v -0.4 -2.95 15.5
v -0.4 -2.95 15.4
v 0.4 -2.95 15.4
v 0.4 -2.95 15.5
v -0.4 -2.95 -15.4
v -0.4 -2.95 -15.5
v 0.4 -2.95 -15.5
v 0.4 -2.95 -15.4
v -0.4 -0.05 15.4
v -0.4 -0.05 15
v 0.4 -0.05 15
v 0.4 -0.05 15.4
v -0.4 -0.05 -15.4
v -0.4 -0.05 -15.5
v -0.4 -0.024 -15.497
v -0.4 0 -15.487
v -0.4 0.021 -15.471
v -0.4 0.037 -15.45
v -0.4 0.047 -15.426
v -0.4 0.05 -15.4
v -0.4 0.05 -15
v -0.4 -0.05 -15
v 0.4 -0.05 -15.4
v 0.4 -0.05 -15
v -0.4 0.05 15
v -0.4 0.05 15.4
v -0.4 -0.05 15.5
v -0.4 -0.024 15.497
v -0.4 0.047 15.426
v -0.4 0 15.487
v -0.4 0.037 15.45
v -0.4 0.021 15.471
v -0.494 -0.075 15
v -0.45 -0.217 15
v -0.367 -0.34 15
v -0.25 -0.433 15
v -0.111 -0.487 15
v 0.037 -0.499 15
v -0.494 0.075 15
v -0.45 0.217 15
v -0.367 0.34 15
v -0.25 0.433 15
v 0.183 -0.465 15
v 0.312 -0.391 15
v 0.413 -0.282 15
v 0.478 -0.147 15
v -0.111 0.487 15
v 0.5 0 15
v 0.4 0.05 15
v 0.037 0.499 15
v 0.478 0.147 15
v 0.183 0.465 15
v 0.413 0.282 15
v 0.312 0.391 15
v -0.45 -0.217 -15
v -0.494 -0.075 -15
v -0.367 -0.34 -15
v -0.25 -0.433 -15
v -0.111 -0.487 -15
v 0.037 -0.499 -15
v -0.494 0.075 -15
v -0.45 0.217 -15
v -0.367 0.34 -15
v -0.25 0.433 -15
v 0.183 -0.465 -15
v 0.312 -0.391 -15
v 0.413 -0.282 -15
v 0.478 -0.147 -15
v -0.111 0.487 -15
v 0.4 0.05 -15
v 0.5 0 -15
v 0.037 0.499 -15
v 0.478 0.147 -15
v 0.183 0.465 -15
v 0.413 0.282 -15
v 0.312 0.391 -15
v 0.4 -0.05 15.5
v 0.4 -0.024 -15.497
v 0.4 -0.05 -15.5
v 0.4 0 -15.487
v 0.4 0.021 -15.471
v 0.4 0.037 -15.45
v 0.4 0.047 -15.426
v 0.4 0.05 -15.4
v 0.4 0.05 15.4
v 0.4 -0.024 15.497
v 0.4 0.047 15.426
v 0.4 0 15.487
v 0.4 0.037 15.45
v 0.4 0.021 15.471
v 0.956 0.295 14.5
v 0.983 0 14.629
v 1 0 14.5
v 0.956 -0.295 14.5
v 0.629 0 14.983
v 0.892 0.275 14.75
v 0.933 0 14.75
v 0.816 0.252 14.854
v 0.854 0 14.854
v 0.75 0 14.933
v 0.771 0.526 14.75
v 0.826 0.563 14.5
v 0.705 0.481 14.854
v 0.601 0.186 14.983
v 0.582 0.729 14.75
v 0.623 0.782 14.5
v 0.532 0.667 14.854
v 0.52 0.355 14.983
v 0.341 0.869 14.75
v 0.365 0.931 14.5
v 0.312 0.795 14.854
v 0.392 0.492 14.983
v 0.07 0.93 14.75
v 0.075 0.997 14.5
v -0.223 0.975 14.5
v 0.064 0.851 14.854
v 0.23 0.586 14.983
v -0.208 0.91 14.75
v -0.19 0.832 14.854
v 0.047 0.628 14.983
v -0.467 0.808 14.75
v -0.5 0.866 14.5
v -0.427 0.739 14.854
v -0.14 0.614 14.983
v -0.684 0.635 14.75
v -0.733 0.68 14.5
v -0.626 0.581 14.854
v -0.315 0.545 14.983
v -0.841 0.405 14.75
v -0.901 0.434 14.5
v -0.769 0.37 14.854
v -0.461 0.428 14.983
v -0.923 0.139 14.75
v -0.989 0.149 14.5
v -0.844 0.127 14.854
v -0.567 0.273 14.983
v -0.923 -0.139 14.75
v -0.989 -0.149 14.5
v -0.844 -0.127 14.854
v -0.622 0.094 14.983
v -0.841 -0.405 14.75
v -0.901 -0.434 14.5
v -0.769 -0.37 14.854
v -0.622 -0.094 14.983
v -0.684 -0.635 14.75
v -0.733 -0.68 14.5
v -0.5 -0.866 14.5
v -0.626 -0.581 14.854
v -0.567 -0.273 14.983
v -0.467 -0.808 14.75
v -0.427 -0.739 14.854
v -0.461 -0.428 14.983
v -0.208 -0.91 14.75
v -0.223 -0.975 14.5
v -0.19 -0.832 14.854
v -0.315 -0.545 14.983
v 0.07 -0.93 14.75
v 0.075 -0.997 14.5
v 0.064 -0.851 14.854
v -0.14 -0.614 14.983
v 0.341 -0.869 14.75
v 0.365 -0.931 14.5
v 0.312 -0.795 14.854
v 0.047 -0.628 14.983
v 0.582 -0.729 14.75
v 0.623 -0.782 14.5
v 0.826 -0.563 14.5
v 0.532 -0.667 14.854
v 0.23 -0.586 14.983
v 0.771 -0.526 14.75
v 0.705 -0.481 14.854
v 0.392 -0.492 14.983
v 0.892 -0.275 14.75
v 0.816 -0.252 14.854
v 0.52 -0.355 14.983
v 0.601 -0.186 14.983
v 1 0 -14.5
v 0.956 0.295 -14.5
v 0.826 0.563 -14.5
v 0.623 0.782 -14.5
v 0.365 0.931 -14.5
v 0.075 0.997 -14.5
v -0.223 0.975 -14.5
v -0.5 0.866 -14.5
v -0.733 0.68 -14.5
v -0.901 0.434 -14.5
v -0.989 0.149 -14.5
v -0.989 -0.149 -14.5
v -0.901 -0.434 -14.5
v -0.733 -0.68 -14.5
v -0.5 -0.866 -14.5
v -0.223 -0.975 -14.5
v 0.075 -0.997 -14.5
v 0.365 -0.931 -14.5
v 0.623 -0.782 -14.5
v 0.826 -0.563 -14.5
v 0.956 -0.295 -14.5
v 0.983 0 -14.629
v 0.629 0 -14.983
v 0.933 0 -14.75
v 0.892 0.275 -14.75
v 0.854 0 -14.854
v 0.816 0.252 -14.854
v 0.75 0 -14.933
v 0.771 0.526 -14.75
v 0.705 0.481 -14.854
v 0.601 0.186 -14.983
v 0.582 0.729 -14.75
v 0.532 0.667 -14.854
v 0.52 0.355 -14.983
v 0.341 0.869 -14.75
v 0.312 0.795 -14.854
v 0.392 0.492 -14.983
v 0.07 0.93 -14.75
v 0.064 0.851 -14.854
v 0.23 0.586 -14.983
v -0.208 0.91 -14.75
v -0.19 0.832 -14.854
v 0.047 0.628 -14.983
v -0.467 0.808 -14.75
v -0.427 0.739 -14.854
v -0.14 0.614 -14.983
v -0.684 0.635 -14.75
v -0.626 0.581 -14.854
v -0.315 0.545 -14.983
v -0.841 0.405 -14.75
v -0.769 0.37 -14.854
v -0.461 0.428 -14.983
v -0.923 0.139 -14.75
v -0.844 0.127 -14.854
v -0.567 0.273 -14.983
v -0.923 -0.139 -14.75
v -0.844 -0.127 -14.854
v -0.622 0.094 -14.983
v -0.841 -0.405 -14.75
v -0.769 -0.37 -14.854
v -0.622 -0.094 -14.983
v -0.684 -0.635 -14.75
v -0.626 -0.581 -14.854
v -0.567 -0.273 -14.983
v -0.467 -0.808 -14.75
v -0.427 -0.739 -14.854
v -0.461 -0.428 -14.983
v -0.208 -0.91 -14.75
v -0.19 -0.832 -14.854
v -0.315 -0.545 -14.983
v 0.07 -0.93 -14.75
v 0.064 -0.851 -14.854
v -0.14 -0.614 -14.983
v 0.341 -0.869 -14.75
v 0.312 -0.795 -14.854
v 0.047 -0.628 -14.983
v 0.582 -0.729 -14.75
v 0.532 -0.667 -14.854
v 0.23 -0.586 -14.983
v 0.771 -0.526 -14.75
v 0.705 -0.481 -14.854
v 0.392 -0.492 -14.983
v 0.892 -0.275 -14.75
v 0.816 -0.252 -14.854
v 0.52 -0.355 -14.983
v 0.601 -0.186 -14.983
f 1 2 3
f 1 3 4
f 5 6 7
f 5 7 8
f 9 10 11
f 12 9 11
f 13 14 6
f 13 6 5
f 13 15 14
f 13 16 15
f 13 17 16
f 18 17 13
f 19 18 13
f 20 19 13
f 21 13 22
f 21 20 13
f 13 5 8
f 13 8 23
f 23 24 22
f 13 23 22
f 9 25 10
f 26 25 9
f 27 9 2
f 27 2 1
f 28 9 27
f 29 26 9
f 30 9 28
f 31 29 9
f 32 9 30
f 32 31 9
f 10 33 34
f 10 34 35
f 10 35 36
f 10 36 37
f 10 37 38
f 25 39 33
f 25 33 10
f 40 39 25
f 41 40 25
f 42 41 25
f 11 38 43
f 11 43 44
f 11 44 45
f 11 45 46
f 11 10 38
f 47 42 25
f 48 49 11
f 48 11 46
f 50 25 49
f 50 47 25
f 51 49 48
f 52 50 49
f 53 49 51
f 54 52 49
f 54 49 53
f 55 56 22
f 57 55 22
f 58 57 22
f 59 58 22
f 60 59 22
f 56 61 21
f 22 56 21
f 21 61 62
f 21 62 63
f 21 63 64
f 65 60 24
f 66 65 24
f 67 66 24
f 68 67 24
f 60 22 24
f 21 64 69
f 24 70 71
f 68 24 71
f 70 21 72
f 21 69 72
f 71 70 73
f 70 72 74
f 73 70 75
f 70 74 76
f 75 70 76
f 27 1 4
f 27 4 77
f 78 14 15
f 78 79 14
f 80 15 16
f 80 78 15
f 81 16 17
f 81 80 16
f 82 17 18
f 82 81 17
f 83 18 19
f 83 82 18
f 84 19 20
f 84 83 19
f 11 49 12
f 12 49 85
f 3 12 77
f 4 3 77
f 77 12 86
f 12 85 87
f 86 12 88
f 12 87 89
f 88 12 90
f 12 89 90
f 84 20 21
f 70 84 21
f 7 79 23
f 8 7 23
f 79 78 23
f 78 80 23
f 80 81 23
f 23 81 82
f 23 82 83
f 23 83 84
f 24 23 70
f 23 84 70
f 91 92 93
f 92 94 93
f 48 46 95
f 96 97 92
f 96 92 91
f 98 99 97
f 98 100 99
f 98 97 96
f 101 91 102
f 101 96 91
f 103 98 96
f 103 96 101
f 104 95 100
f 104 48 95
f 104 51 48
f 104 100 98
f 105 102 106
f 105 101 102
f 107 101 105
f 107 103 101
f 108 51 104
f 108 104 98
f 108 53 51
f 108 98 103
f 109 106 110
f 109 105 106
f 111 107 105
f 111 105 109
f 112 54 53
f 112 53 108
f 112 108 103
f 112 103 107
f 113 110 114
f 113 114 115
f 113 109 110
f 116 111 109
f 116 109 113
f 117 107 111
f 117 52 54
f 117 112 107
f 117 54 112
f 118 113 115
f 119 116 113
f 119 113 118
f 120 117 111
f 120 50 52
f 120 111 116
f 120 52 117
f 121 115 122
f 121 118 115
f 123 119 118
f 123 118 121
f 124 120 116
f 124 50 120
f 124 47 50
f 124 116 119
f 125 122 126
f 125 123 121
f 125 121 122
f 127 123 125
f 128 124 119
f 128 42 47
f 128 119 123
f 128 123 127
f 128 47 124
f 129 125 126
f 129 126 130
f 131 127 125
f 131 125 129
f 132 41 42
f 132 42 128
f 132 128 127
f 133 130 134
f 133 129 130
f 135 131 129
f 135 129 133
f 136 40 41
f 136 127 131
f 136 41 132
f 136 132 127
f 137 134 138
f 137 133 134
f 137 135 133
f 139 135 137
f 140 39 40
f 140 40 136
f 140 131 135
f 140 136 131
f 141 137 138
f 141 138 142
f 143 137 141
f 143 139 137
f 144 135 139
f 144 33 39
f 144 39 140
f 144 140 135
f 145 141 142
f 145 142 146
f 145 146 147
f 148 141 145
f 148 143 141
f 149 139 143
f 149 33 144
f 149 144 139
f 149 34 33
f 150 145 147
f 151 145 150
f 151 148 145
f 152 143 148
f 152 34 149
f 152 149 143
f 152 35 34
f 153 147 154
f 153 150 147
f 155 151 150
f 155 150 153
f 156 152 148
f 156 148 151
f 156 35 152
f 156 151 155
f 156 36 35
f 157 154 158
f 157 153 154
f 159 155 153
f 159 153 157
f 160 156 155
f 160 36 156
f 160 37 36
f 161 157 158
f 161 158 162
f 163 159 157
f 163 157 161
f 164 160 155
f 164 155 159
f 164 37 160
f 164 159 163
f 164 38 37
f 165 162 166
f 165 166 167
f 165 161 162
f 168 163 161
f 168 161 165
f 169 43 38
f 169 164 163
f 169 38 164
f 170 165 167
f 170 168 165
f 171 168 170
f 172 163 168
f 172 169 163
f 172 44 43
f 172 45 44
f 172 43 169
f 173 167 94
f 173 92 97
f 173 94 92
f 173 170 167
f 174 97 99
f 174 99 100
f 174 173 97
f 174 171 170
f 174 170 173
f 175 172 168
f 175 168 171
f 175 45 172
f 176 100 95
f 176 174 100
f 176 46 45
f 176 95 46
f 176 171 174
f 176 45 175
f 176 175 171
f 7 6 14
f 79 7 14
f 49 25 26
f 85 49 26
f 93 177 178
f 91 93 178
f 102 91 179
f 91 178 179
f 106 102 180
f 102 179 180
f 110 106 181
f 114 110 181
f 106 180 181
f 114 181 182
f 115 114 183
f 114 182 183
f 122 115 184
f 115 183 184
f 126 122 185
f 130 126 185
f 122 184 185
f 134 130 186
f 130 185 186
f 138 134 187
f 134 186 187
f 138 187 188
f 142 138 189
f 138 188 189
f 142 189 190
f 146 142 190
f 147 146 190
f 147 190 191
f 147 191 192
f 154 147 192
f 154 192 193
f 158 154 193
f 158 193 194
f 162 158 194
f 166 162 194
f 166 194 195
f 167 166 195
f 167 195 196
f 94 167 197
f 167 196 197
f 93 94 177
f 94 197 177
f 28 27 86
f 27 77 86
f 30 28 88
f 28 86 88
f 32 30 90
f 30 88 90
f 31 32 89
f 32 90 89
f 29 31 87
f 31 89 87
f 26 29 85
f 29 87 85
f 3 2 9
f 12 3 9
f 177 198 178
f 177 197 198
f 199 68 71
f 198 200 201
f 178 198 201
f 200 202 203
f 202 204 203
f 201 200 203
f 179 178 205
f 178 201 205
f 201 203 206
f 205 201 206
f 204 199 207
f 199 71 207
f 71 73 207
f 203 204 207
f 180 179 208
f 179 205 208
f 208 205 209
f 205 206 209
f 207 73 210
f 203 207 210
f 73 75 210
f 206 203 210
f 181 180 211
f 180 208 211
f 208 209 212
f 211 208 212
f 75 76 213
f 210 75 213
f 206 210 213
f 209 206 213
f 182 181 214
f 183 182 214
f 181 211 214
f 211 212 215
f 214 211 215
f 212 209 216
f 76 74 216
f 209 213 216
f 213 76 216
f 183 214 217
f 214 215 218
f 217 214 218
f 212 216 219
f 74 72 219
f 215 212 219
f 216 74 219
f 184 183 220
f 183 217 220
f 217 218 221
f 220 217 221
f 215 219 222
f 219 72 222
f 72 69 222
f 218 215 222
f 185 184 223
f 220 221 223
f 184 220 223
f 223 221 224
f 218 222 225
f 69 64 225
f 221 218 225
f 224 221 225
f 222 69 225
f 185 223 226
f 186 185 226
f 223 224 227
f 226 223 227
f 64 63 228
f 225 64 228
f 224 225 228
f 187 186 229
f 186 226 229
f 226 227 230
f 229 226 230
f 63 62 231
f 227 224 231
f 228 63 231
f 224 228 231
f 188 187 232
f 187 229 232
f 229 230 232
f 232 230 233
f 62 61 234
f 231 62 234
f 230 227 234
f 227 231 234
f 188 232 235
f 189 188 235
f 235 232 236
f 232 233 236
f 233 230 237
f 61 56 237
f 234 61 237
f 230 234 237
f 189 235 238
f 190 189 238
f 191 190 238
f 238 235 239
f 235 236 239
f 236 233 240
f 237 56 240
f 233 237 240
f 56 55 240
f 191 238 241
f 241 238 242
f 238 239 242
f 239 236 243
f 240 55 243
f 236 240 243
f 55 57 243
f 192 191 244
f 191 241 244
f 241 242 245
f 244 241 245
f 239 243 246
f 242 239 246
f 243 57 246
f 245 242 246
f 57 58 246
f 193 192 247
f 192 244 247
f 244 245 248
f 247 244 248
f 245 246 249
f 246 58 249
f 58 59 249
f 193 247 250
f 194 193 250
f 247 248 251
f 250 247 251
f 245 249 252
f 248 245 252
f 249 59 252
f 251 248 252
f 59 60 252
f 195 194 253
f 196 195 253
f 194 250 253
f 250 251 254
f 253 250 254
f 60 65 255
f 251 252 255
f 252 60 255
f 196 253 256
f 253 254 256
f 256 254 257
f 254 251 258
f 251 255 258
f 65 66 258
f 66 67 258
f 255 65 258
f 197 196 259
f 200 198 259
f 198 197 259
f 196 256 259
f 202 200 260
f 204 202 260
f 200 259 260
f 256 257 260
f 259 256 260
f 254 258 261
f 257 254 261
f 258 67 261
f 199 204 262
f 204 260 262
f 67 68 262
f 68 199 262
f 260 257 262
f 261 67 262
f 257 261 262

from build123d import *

# Parameters (mm, degrees)
BOSS_EXTRU_1_DEPTH      = 15
BOSS_EXTRU_1_DEPTH_BACK = 15
ESQUISSE1_R             = 1
ESQUISSE2_W             = 0.8
ESQUISSE2_H             = 0.1
BOSS_EXTRU_2_DEPTH      = 1
ESQUISSE3_W             = 0.8
ESQUISSE3_H             = 0.1
BOSS_EXTRU_3_DEPTH      = 1
CONG_1_R                = 0.5
ESQUISSE4_W             = 0.1
ESQUISSE4_H             = 3
BOSS_EXTRU_4_DEPTH      = 0.8
ESQUISSE5_W             = 0.5
ESQUISSE5_H             = 0.1
ENL_V_MAT_EXTRU_1_DEPTH = 0.8
CONG_2_R                = 0.1
ESQUISSE6_W             = 0.1
ESQUISSE6_H             = 3
BOSS_EXTRU_5_DEPTH      = 0.8
ESQUISSE7_W             = 0.5
ESQUISSE7_H             = 0.1
ENL_V_MAT_EXTRU_2_DEPTH = 0.8
CONG_3_R                = 0.1


with BuildPart() as part:
    # Esquisse1 → Boss.-Extru.1 (new, two sides: drawn at the far end of the back side and taken through both)
    with BuildSketch(Plane.XY.offset(-BOSS_EXTRU_1_DEPTH_BACK)):
        Circle(ESQUISSE1_R)
    extrude(amount=BOSS_EXTRU_1_DEPTH + BOSS_EXTRU_1_DEPTH_BACK)

    # Esquisse2 → Boss.-Extru.2 (add)
    with BuildSketch(Plane.XY.offset(15)):
        Rectangle(ESQUISSE2_W, ESQUISSE2_H)
    extrude(amount=BOSS_EXTRU_2_DEPTH)

    # Esquisse3 → Boss.-Extru.3 (add)
    with BuildSketch(Plane(origin=(0, 0, -15), x_dir=(-1, 0, 0), z_dir=(0, 0, -1))):
        Rectangle(ESQUISSE3_W, ESQUISSE3_H)
    extrude(amount=BOSS_EXTRU_3_DEPTH)

    # Congé1
    cong_1_edges = [part.edges().sort_by_distance(p)[0] for p in [
        (-1, 0, 15),
        (-1, 0, -15),
    ]]
    fillet(cong_1_edges, radius=CONG_1_R)

    # Esquisse4 → Boss.-Extru.4 (add)
    with BuildSketch(Plane.ZY.offset(0.4)):
        with Locations((-15.45, -1.45)):
            Rectangle(ESQUISSE4_W, ESQUISSE4_H)
    extrude(amount=-BOSS_EXTRU_4_DEPTH)

    # Esquisse5 → Enlèv. mat.-Extru.1 (cut)
    with BuildSketch(Plane.ZY.offset(0.4)):
        with Locations((-15.75, 0)):
            Rectangle(ESQUISSE5_W, ESQUISSE5_H)
    extrude(amount=-ENL_V_MAT_EXTRU_1_DEPTH, mode=Mode.SUBTRACT)

    # Congé2
    cong_2_edges = [part.edges().sort_by_distance(p)[0] for p in [
        (0, 0.05, -15.5),
    ]]
    fillet(cong_2_edges, radius=CONG_2_R - 0.0001)  # a hair under: the kernel refuses the full size

    # Esquisse6 → Boss.-Extru.5 (add)
    with BuildSketch(Plane.ZY.offset(0.4)):
        with Locations((15.45, -1.45)):
            Rectangle(ESQUISSE6_W, ESQUISSE6_H)
    extrude(amount=-BOSS_EXTRU_5_DEPTH)

    # Esquisse7 → Enlèv. mat.-Extru.2 (cut)
    with BuildSketch(Plane.ZY.offset(0.4)):
        with Locations((15.75, 0)):
            Rectangle(ESQUISSE7_W, ESQUISSE7_H)
    extrude(amount=-ENL_V_MAT_EXTRU_2_DEPTH, mode=Mode.SUBTRACT)

    # Congé3
    cong_3_edges = [part.edges().sort_by_distance(p)[0] for p in [
        (0, 0.05, 15.5),
    ]]
    fillet(cong_3_edges, radius=CONG_3_R)


solid = part.part
